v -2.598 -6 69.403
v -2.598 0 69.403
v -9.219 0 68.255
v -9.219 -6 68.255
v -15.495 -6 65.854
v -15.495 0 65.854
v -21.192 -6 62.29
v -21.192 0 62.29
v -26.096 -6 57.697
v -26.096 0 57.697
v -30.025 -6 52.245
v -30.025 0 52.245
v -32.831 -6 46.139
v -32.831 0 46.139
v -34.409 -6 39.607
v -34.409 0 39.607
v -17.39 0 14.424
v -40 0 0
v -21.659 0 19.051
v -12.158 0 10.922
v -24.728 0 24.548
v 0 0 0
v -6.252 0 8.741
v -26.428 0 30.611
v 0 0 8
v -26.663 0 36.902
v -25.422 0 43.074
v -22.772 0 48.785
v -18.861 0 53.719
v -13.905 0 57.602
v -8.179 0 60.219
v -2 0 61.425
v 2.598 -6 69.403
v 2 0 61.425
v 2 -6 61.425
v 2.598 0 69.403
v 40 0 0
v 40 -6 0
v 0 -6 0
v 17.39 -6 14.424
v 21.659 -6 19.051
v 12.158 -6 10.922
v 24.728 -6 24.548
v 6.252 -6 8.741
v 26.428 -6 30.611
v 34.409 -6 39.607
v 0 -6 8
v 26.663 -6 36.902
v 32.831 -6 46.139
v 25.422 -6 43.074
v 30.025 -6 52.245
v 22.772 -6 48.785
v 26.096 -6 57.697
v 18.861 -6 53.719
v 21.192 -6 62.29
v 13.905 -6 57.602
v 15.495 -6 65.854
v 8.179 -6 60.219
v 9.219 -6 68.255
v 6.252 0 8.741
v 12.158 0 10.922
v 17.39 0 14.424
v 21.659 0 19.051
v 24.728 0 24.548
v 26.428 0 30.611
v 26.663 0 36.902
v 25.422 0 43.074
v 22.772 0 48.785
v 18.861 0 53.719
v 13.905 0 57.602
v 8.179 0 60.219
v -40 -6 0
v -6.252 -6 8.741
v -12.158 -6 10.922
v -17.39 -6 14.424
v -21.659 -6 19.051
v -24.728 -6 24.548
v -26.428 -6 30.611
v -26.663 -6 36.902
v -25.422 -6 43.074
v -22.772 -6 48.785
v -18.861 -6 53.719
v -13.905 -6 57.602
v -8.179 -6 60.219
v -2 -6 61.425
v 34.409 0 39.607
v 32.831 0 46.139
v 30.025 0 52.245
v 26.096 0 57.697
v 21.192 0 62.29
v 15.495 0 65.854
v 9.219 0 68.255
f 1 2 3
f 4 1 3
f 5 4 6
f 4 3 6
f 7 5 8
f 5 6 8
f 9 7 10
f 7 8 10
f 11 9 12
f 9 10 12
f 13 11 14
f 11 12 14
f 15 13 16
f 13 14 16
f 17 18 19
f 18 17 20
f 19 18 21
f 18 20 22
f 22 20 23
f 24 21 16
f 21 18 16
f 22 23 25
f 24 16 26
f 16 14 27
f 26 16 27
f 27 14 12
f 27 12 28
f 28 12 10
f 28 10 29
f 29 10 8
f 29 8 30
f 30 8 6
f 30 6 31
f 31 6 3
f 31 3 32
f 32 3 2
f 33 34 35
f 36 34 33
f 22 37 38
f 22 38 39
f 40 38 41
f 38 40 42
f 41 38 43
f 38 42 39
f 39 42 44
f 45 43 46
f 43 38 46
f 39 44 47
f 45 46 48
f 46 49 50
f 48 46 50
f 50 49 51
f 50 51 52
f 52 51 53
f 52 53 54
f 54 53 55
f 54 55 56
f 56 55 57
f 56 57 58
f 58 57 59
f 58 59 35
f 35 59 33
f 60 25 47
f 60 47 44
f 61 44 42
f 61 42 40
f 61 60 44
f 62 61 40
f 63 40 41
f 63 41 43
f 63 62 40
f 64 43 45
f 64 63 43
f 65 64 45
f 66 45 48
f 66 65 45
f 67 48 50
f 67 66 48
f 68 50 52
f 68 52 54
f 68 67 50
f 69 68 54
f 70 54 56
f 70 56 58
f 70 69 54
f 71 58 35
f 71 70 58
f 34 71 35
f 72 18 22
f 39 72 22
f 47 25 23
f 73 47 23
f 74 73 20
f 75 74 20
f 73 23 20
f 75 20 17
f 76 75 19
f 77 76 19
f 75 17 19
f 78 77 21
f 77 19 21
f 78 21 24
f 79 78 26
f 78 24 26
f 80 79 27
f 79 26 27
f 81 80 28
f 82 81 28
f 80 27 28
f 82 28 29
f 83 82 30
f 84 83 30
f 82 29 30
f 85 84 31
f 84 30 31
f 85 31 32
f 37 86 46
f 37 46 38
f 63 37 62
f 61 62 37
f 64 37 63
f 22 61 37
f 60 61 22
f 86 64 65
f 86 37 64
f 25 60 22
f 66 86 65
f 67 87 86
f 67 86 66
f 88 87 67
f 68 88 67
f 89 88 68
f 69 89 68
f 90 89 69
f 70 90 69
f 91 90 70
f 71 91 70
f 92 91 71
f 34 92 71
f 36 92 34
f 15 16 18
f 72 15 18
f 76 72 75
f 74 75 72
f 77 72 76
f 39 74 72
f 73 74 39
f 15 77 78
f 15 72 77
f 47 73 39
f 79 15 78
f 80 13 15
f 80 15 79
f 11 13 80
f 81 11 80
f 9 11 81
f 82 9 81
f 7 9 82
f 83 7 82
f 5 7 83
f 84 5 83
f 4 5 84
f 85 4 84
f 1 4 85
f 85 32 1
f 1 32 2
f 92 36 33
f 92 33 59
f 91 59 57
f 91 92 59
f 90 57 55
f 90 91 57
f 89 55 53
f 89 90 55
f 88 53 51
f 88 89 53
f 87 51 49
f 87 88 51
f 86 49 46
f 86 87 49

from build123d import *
from build123d import SkipClean  # not in build123d's __all__

# Parameters (mm, degrees)
F1_DEPTH = 6


with BuildPart() as f1:
    # F0 (on Front) → F1 (new body)
    with BuildSketch(Plane.XZ):
        with BuildLine():
            ThreePointArc((-2.5981308411, 69.4027374984), (-23.7554424043, 60.1122052703), (-34.4088510941, 39.607310612))
            Line((-34.4088510941, 39.607310612), (-40, 0))
            Line((-40, 0), (0, 0))
            Line((0, 0), (0, 8))
            ThreePointArc((0, 8), (-26.7312756631, 33.7492995345), (-2, 61.4251288657))
            Line((-2, 61.4251288657), (-2.5981308411, 69.4027374984))
        make_face()
    extrude(amount=F1_DEPTH)

    # F2: F1 across plane


with BuildPart() as f1_1:
    add(f1.part, clean=False)
    with SkipClean():  # cleaning this boolean's faces spoils the solid; the shape is the same uncleaned
        add(f1.part.mirror(Plane.YZ), clean=False)


solid = f1_1.part
